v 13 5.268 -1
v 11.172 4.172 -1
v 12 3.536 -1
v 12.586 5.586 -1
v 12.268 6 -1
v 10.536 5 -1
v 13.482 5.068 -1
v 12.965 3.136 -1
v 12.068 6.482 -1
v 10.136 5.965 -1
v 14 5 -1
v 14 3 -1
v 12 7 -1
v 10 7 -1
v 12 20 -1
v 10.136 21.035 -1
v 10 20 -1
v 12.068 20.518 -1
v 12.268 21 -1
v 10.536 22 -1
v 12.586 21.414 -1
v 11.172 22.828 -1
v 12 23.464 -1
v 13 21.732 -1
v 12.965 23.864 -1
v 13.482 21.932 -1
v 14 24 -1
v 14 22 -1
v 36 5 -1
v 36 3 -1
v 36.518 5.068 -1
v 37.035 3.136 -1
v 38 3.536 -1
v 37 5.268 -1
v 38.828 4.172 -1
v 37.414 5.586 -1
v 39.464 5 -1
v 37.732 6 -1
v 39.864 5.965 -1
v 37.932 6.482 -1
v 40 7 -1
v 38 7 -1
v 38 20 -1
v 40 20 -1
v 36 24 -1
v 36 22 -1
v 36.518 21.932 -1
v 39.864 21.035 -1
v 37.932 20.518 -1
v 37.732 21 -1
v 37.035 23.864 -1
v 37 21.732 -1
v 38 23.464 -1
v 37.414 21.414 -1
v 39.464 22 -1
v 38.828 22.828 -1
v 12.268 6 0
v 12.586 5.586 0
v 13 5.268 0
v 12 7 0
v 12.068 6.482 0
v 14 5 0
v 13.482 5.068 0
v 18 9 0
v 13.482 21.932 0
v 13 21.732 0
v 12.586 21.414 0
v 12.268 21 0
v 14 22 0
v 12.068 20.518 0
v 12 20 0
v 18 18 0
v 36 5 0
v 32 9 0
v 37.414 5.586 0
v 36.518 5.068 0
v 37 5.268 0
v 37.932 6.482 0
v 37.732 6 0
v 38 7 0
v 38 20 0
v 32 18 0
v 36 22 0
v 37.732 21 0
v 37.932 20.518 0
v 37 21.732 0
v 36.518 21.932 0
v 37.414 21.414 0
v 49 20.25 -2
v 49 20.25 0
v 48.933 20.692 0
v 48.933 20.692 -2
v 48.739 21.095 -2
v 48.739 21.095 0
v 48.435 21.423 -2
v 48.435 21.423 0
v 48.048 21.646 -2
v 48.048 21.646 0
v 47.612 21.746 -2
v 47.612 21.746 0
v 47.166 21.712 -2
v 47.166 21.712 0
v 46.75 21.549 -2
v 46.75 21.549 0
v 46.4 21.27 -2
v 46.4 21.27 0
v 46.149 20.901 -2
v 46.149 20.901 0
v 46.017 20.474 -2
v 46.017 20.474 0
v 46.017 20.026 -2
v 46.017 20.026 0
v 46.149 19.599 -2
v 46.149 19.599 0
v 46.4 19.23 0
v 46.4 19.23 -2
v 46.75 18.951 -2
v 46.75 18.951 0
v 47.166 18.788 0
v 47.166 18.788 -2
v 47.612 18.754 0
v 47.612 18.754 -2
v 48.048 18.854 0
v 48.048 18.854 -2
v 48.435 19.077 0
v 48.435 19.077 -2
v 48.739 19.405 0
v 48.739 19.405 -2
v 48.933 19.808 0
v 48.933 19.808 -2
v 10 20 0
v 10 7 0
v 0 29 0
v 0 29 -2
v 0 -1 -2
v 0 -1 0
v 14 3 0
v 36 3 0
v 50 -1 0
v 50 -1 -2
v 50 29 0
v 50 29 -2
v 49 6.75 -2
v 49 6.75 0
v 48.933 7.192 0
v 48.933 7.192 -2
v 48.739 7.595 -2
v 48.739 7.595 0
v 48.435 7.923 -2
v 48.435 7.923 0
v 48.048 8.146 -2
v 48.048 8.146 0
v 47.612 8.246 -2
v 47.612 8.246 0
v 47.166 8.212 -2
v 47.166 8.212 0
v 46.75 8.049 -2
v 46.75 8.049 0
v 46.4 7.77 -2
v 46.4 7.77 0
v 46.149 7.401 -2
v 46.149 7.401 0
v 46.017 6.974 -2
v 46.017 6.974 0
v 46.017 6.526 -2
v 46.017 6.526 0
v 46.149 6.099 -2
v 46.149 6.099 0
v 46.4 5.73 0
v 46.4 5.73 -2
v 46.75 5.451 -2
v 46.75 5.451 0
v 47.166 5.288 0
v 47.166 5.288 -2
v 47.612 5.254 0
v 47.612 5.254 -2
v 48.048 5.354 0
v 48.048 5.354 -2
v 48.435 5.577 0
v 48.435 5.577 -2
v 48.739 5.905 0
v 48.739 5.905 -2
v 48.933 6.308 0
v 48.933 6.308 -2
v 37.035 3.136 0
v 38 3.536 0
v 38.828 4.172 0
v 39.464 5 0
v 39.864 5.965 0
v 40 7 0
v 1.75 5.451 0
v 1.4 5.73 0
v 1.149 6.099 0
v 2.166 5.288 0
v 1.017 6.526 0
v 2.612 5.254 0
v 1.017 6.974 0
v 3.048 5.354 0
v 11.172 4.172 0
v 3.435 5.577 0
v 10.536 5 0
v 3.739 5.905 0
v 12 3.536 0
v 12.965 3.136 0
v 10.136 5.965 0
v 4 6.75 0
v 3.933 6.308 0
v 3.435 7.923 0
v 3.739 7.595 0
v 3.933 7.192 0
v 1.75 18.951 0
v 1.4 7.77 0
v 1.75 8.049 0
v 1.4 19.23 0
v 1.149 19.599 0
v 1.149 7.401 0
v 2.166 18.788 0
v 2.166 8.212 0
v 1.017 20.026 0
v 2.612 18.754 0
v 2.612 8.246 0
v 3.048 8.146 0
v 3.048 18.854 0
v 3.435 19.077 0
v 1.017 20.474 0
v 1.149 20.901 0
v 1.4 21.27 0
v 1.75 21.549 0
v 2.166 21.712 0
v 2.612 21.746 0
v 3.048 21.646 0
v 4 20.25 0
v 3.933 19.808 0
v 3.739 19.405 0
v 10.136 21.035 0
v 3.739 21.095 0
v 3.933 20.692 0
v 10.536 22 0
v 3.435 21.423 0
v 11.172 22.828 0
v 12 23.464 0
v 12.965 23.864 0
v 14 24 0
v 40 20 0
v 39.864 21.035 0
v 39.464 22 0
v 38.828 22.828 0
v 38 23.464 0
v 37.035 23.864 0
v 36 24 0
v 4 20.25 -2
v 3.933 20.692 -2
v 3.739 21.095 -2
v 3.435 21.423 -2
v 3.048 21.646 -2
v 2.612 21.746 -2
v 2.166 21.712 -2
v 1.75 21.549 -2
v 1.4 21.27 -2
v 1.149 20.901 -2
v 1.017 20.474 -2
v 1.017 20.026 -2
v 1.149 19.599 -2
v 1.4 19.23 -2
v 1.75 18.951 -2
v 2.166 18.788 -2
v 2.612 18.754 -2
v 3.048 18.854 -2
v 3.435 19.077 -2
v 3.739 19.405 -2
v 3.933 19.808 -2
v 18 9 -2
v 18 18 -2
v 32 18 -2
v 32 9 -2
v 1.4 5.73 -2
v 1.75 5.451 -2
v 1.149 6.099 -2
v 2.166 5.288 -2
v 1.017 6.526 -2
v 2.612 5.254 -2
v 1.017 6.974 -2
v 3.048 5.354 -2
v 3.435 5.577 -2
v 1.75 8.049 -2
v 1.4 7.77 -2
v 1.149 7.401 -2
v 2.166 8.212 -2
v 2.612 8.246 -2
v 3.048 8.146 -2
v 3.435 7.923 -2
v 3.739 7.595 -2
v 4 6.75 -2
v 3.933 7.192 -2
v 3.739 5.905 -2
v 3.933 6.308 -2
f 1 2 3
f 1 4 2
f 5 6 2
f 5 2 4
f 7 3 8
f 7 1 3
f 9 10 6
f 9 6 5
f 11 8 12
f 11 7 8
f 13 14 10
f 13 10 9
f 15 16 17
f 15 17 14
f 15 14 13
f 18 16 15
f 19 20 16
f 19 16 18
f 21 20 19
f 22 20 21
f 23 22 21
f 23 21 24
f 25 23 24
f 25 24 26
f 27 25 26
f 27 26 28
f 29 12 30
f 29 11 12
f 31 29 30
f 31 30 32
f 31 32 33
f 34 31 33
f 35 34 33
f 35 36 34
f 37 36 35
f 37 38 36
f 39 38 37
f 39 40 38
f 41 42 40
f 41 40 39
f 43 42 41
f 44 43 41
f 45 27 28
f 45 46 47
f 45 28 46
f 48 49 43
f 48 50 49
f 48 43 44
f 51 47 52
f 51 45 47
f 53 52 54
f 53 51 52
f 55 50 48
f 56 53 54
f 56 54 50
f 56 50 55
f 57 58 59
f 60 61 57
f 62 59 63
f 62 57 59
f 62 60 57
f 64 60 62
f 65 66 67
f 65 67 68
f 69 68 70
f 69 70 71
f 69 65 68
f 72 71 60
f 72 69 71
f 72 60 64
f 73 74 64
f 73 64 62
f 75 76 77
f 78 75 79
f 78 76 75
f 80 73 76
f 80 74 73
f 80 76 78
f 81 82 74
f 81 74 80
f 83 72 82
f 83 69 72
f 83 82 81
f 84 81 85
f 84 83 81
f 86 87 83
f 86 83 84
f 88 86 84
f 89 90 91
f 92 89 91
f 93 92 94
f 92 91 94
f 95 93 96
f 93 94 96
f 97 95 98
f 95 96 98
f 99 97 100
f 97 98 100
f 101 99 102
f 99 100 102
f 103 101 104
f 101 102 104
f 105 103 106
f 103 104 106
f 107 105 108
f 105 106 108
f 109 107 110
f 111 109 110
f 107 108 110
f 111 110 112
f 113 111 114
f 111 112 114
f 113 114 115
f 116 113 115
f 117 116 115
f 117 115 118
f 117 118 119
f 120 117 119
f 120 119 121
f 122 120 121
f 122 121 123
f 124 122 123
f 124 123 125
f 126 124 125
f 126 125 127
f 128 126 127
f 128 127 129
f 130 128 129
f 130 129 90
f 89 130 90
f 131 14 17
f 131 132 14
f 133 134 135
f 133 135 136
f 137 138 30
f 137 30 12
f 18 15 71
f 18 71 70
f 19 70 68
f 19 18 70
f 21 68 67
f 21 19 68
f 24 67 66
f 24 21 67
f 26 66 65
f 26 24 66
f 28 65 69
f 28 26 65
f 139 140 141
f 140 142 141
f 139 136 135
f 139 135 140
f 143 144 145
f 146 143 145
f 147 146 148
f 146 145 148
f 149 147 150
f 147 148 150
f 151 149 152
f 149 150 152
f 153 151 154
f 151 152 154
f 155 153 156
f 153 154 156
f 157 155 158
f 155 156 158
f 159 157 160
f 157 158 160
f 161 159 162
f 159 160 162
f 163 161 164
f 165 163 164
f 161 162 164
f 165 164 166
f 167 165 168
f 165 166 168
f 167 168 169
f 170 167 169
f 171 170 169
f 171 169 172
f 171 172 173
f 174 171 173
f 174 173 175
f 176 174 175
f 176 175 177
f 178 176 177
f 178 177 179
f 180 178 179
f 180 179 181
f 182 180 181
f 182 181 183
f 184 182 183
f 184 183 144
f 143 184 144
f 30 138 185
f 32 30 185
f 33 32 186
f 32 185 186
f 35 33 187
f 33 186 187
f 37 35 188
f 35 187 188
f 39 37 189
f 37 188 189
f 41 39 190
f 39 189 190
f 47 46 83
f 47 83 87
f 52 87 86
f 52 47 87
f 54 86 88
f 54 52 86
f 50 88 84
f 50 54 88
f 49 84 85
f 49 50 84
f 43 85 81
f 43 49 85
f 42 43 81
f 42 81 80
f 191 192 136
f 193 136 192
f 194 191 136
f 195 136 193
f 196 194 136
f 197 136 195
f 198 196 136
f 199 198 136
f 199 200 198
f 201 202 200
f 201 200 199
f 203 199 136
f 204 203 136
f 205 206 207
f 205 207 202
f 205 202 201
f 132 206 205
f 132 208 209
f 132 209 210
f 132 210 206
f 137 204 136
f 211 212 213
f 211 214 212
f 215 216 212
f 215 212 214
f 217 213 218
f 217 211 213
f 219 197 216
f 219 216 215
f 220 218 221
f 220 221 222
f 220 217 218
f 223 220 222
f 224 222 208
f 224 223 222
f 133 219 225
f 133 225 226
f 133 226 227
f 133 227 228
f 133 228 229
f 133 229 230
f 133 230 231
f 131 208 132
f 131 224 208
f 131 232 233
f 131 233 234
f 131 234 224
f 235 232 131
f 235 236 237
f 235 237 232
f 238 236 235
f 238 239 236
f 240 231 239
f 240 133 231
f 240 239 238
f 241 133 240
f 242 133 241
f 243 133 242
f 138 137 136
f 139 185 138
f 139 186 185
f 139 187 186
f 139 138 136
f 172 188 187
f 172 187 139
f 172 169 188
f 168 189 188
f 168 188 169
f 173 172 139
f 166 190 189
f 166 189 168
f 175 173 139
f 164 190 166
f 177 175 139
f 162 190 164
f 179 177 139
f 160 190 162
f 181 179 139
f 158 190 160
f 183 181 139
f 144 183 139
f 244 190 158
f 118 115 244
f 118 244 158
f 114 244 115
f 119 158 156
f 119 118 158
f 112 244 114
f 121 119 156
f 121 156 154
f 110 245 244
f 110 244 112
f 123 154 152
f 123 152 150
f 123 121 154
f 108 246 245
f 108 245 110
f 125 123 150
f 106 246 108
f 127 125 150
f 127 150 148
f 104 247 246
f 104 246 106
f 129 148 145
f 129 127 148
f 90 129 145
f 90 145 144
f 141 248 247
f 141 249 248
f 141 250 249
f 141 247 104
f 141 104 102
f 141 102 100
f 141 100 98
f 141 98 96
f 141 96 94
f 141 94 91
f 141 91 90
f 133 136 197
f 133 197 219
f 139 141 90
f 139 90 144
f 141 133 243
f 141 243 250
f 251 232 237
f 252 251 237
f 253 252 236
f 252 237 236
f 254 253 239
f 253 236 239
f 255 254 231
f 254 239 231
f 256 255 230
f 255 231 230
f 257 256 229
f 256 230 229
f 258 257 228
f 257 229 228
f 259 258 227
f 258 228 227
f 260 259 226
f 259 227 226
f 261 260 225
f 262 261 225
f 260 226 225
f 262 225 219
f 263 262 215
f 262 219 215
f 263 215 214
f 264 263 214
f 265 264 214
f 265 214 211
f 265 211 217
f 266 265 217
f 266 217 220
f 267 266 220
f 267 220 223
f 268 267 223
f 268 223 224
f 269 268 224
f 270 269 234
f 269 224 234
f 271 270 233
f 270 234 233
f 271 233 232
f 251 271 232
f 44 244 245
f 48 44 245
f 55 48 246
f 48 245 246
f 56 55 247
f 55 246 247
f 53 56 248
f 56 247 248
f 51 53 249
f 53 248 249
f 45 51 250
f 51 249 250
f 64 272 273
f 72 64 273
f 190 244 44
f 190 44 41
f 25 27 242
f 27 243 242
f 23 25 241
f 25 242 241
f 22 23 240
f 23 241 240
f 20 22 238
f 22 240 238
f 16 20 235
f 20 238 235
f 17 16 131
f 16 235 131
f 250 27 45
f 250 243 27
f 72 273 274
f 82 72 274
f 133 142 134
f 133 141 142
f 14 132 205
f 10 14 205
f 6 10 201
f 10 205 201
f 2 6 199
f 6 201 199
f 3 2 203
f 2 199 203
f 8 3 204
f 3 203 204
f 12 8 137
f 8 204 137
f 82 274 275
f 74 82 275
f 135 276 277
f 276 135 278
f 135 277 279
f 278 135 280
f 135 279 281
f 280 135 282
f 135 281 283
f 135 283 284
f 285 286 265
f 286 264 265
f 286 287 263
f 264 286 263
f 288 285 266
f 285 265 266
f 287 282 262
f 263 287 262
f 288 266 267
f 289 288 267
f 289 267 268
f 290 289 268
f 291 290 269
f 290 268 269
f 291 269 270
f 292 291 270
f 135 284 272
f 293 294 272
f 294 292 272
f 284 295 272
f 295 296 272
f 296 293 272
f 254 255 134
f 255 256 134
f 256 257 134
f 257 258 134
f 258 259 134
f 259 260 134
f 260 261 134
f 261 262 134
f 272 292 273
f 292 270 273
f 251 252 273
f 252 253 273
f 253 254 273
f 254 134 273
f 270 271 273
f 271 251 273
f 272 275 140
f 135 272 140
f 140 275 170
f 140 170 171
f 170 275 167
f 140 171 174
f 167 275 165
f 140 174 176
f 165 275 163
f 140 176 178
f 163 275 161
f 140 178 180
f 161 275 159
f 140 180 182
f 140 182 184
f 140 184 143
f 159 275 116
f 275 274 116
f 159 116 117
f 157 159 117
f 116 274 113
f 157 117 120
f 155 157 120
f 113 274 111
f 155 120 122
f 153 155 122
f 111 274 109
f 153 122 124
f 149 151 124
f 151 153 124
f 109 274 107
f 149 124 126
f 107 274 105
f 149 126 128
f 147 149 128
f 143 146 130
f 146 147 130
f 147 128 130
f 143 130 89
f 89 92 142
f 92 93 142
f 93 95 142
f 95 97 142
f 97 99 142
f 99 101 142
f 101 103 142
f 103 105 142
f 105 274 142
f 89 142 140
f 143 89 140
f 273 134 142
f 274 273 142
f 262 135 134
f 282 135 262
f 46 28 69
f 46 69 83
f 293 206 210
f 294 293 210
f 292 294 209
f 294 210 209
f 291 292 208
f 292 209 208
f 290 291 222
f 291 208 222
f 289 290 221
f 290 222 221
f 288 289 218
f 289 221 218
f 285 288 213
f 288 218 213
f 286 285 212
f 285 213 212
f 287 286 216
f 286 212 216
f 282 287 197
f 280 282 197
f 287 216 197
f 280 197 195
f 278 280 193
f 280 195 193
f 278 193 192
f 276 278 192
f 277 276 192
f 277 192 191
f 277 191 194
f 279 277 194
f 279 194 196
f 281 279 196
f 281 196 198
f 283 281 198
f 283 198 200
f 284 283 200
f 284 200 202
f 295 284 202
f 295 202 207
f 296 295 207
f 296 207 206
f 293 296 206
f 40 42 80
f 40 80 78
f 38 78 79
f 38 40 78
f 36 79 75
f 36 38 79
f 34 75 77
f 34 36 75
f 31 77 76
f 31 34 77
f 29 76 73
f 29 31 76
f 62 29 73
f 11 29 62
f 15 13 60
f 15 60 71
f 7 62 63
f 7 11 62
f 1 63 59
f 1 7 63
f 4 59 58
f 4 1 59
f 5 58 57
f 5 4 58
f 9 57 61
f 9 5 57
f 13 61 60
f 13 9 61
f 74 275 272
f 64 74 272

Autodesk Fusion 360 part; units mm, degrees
sketch "Sketch1" plane through (0, 0, 0) normal (0, 0, 1) x (1, 0, 0)
  line L0 (0, 0) -> (50, 0)
  line L1 (50, 0) -> (50, 27)
  line L2 (50, 27) -> (0, 27)
  line L3 (0, 27) -> (0, 0)
  dimension "d1" = 27
  dimension "d2" = 50
extrude "Extrude1" add sketch "Sketch1" against normal blind 5
extrude "Extrude2" cut 1 faces at (16.6667, 18, -5) along direction (0, 0, 1) blind 3
sketch "Sketch3" plane through (0, 0, 0) normal (0, 0, 1) x (1, 0, 0)
  line L0 (0, 27) -> (0, 0)
  line L1 (0, 0) -> (50, 0)
  line L2 (50, 0) -> (50, 27)
  line L3 (50, 27) -> (0, 27)
  line L4 (10, 24) -> (40, 24)
  line L5 (40, 24) -> (40, 3)
  line L6 (40, 3) -> (10, 3)
  line L7 (10, 3) -> (10, 24)
  line L8 (36, 5) -> (14, 5)
  line L9 (12, 7) -> (12, 20)
  line L10 (14, 22) -> (36, 22)
  line L11 (38, 20) -> (38, 7)
  arc A0 (38, 20) -> (36, 22) centre (36, 20) ccw
  arc A1 (36, 5) -> (38, 7) centre (36, 7) ccw
  arc A2 (12, 7) -> (14, 5) centre (14, 7) ccw
  arc A3 (14, 22) -> (12, 20) centre (14, 20) ccw
  dimension "d10" = 21
  dimension "d11" = 3
  dimension "d12" = 30
  dimension "d13" = 10
  dimension "d22" = 2
extrude "Extrude3" add 1 faces at (16.6667, 18, -2) along direction (0, 0, -1) blind 1
extrude "Extrude4" cut sketch "Sketch3" against normal blind 2 contours L8 L9 L10 L11 A0 A1 A2 A3
sketch "Sketch5" plane through (0, 0, 0) normal (0, 0, 1) x (1, 0, 0)
  line L0 (14, 22) -> (36, 22)
  arc A0 (38, 20) -> (36, 22) centre (36, 20) ccw
  line L1 (38, 20) -> (38, 7)
  arc A1 (36, 5) -> (38, 7) centre (36, 7) ccw
  line L2 (36, 5) -> (14, 5)
  arc A2 (12, 7) -> (14, 5) centre (14, 7) ccw
  line L3 (12, 7) -> (12, 20)
  arc A3 (14, 22) -> (12, 20) centre (14, 20) ccw
  line L4 (0, 27) -> (0, 0)
  line L5 (0, 0) -> (50, 0)
  line L6 (50, 0) -> (50, 27)
  line L7 (50, 27) -> (0, 27)
  line L8 (14, 24) -> (36, 24)
  arc A4 (40, 20) -> (36, 24) centre (36, 20) ccw
  line L9 (40, 20) -> (40, 7)
  arc A5 (36, 3) -> (40, 7) centre (36, 7) ccw
  line L10 (36, 3) -> (14, 3)
  arc A6 (10, 7) -> (14, 3) centre (14, 7) ccw
  line L11 (10, 7) -> (10, 20)
  arc A7 (14, 24) -> (10, 20) centre (14, 20) ccw
  dimension "d23" = 2
extrude "Extrude5" cut sketch "Sketch5" against normal blind 1 contours L8 A4 L9 A5 L10 A6 L11 A7
sketch "Sketch6" plane through (0, 0, -2) normal (0, 0, 1) x (1, 0, 0)
  arc A0 (38, 20) -> (36, 22) centre (36, 20) ccw
  line L0 (36, 22) -> (14, 22)
  arc A1 (14, 22) -> (12, 20) centre (14, 20) ccw
  line L1 (12, 20) -> (12, 7)
  arc A2 (12, 7) -> (14, 5) centre (14, 7) ccw
  line L2 (14, 5) -> (36, 5)
  arc A3 (36, 5) -> (38, 7) centre (36, 7) ccw
  line L3 (38, 7) -> (38, 20)
  line L4 (18, 18) -> (32, 18)
  line L5 (32, 18) -> (32, 9)
  line L6 (32, 9) -> (18, 9)
  line L7 (18, 9) -> (18, 18)
  dimension "d28" = 4
  dimension "d29" = 4
  dimension "d30" = 9
  dimension "d31" = 6
  dimension "d32" = 6
extrude "Extrude6" cut sketch "Sketch6" against normal blind 10 contours L4 L5 L6 L7
sketch "Sketch7" plane through (0, 0, 0) normal (0, 0, 1) x (1, 0, 0)
  line L0 (14, 24) -> (36, 24)
  arc A0 (40, 20) -> (36, 24) centre (36, 20) ccw
  line L1 (40, 20) -> (40, 7)
  arc A1 (36, 3) -> (40, 7) centre (36, 7) ccw
  line L2 (36, 3) -> (14, 3)
  arc A2 (10, 7) -> (14, 3) centre (14, 7) ccw
  line L3 (10, 7) -> (10, 20)
  arc A3 (14, 24) -> (10, 20) centre (14, 20) ccw
  line L4 (0, 27) -> (0, 0)
  line L5 (0, 0) -> (50, 0)
  line L6 (50, 0) -> (50, 27)
  line L7 (50, 27) -> (0, 27)
  line L8 (0, 27) -> (5, 27)
  line L9 (5, 27) -> (5, 0)
  line L10 (5, 13.5) -> (0, 13.5)
  line L11 (2.5, 13.5) -> (2.5, 27)
  line L12 (2.5, 13.5) -> (2.5, 20.25)
  circle A4 centre (2.5, 20.25) radius 1.5
  line L13 (2.5, 13.5) -> (2.5, 6.75)
  circle A5 centre (2.5, 6.75) radius 1.5
  line L14 (50, 27) -> (45, 27)
  line L15 (45, 27) -> (45, 0)
  line L16 (45, 0) -> (50, 0)
  line L17 (50, 0) -> (50, 27)
  line L18 (45, 13.5) -> (50, 13.5)
  line L19 (47.5, 13.5) -> (47.5, 20.25)
  circle A6 centre (47.5, 20.25) radius 1.5
  line L20 (47.5, 13.5) -> (47.5, 6.75)
  circle A7 centre (47.5, 6.75) radius 1.5
  dimension "d35" = 3
  dimension "d36" = 6.75
  dimension "d37" = 3
  dimension "d40" = 6.75
  dimension "d41" = 3
  dimension "d42" = 6.75
  dimension "d43" = 3
extrude "Extrude7" cut sketch "Sketch7" against normal blind 10 contours A5 | L11 L12 A4 | L11 L12 A4
extrude "Extrude8" cut sketch "Sketch7" against normal blind 11 contours A5 | L11 L12 A4 | L11 L12 A4 | A6 | A7
extrude "Extrude9" add 1 faces at (36, 15, -2) along direction (0, 0, 1) blind 2
extrude "Extrude10" cut 1 faces at (22.6667, 24, -3) along direction (0, 0, 1) blind 1
extrude "Extrude11" add 1 faces at (33.3333, 27, -0.6667) along direction (0, 1, 0) blind 2
extrude "Extrude12" add 1 faces at (16.6667, 0, -0.6667) along direction (0, -1, 0) blind 1
